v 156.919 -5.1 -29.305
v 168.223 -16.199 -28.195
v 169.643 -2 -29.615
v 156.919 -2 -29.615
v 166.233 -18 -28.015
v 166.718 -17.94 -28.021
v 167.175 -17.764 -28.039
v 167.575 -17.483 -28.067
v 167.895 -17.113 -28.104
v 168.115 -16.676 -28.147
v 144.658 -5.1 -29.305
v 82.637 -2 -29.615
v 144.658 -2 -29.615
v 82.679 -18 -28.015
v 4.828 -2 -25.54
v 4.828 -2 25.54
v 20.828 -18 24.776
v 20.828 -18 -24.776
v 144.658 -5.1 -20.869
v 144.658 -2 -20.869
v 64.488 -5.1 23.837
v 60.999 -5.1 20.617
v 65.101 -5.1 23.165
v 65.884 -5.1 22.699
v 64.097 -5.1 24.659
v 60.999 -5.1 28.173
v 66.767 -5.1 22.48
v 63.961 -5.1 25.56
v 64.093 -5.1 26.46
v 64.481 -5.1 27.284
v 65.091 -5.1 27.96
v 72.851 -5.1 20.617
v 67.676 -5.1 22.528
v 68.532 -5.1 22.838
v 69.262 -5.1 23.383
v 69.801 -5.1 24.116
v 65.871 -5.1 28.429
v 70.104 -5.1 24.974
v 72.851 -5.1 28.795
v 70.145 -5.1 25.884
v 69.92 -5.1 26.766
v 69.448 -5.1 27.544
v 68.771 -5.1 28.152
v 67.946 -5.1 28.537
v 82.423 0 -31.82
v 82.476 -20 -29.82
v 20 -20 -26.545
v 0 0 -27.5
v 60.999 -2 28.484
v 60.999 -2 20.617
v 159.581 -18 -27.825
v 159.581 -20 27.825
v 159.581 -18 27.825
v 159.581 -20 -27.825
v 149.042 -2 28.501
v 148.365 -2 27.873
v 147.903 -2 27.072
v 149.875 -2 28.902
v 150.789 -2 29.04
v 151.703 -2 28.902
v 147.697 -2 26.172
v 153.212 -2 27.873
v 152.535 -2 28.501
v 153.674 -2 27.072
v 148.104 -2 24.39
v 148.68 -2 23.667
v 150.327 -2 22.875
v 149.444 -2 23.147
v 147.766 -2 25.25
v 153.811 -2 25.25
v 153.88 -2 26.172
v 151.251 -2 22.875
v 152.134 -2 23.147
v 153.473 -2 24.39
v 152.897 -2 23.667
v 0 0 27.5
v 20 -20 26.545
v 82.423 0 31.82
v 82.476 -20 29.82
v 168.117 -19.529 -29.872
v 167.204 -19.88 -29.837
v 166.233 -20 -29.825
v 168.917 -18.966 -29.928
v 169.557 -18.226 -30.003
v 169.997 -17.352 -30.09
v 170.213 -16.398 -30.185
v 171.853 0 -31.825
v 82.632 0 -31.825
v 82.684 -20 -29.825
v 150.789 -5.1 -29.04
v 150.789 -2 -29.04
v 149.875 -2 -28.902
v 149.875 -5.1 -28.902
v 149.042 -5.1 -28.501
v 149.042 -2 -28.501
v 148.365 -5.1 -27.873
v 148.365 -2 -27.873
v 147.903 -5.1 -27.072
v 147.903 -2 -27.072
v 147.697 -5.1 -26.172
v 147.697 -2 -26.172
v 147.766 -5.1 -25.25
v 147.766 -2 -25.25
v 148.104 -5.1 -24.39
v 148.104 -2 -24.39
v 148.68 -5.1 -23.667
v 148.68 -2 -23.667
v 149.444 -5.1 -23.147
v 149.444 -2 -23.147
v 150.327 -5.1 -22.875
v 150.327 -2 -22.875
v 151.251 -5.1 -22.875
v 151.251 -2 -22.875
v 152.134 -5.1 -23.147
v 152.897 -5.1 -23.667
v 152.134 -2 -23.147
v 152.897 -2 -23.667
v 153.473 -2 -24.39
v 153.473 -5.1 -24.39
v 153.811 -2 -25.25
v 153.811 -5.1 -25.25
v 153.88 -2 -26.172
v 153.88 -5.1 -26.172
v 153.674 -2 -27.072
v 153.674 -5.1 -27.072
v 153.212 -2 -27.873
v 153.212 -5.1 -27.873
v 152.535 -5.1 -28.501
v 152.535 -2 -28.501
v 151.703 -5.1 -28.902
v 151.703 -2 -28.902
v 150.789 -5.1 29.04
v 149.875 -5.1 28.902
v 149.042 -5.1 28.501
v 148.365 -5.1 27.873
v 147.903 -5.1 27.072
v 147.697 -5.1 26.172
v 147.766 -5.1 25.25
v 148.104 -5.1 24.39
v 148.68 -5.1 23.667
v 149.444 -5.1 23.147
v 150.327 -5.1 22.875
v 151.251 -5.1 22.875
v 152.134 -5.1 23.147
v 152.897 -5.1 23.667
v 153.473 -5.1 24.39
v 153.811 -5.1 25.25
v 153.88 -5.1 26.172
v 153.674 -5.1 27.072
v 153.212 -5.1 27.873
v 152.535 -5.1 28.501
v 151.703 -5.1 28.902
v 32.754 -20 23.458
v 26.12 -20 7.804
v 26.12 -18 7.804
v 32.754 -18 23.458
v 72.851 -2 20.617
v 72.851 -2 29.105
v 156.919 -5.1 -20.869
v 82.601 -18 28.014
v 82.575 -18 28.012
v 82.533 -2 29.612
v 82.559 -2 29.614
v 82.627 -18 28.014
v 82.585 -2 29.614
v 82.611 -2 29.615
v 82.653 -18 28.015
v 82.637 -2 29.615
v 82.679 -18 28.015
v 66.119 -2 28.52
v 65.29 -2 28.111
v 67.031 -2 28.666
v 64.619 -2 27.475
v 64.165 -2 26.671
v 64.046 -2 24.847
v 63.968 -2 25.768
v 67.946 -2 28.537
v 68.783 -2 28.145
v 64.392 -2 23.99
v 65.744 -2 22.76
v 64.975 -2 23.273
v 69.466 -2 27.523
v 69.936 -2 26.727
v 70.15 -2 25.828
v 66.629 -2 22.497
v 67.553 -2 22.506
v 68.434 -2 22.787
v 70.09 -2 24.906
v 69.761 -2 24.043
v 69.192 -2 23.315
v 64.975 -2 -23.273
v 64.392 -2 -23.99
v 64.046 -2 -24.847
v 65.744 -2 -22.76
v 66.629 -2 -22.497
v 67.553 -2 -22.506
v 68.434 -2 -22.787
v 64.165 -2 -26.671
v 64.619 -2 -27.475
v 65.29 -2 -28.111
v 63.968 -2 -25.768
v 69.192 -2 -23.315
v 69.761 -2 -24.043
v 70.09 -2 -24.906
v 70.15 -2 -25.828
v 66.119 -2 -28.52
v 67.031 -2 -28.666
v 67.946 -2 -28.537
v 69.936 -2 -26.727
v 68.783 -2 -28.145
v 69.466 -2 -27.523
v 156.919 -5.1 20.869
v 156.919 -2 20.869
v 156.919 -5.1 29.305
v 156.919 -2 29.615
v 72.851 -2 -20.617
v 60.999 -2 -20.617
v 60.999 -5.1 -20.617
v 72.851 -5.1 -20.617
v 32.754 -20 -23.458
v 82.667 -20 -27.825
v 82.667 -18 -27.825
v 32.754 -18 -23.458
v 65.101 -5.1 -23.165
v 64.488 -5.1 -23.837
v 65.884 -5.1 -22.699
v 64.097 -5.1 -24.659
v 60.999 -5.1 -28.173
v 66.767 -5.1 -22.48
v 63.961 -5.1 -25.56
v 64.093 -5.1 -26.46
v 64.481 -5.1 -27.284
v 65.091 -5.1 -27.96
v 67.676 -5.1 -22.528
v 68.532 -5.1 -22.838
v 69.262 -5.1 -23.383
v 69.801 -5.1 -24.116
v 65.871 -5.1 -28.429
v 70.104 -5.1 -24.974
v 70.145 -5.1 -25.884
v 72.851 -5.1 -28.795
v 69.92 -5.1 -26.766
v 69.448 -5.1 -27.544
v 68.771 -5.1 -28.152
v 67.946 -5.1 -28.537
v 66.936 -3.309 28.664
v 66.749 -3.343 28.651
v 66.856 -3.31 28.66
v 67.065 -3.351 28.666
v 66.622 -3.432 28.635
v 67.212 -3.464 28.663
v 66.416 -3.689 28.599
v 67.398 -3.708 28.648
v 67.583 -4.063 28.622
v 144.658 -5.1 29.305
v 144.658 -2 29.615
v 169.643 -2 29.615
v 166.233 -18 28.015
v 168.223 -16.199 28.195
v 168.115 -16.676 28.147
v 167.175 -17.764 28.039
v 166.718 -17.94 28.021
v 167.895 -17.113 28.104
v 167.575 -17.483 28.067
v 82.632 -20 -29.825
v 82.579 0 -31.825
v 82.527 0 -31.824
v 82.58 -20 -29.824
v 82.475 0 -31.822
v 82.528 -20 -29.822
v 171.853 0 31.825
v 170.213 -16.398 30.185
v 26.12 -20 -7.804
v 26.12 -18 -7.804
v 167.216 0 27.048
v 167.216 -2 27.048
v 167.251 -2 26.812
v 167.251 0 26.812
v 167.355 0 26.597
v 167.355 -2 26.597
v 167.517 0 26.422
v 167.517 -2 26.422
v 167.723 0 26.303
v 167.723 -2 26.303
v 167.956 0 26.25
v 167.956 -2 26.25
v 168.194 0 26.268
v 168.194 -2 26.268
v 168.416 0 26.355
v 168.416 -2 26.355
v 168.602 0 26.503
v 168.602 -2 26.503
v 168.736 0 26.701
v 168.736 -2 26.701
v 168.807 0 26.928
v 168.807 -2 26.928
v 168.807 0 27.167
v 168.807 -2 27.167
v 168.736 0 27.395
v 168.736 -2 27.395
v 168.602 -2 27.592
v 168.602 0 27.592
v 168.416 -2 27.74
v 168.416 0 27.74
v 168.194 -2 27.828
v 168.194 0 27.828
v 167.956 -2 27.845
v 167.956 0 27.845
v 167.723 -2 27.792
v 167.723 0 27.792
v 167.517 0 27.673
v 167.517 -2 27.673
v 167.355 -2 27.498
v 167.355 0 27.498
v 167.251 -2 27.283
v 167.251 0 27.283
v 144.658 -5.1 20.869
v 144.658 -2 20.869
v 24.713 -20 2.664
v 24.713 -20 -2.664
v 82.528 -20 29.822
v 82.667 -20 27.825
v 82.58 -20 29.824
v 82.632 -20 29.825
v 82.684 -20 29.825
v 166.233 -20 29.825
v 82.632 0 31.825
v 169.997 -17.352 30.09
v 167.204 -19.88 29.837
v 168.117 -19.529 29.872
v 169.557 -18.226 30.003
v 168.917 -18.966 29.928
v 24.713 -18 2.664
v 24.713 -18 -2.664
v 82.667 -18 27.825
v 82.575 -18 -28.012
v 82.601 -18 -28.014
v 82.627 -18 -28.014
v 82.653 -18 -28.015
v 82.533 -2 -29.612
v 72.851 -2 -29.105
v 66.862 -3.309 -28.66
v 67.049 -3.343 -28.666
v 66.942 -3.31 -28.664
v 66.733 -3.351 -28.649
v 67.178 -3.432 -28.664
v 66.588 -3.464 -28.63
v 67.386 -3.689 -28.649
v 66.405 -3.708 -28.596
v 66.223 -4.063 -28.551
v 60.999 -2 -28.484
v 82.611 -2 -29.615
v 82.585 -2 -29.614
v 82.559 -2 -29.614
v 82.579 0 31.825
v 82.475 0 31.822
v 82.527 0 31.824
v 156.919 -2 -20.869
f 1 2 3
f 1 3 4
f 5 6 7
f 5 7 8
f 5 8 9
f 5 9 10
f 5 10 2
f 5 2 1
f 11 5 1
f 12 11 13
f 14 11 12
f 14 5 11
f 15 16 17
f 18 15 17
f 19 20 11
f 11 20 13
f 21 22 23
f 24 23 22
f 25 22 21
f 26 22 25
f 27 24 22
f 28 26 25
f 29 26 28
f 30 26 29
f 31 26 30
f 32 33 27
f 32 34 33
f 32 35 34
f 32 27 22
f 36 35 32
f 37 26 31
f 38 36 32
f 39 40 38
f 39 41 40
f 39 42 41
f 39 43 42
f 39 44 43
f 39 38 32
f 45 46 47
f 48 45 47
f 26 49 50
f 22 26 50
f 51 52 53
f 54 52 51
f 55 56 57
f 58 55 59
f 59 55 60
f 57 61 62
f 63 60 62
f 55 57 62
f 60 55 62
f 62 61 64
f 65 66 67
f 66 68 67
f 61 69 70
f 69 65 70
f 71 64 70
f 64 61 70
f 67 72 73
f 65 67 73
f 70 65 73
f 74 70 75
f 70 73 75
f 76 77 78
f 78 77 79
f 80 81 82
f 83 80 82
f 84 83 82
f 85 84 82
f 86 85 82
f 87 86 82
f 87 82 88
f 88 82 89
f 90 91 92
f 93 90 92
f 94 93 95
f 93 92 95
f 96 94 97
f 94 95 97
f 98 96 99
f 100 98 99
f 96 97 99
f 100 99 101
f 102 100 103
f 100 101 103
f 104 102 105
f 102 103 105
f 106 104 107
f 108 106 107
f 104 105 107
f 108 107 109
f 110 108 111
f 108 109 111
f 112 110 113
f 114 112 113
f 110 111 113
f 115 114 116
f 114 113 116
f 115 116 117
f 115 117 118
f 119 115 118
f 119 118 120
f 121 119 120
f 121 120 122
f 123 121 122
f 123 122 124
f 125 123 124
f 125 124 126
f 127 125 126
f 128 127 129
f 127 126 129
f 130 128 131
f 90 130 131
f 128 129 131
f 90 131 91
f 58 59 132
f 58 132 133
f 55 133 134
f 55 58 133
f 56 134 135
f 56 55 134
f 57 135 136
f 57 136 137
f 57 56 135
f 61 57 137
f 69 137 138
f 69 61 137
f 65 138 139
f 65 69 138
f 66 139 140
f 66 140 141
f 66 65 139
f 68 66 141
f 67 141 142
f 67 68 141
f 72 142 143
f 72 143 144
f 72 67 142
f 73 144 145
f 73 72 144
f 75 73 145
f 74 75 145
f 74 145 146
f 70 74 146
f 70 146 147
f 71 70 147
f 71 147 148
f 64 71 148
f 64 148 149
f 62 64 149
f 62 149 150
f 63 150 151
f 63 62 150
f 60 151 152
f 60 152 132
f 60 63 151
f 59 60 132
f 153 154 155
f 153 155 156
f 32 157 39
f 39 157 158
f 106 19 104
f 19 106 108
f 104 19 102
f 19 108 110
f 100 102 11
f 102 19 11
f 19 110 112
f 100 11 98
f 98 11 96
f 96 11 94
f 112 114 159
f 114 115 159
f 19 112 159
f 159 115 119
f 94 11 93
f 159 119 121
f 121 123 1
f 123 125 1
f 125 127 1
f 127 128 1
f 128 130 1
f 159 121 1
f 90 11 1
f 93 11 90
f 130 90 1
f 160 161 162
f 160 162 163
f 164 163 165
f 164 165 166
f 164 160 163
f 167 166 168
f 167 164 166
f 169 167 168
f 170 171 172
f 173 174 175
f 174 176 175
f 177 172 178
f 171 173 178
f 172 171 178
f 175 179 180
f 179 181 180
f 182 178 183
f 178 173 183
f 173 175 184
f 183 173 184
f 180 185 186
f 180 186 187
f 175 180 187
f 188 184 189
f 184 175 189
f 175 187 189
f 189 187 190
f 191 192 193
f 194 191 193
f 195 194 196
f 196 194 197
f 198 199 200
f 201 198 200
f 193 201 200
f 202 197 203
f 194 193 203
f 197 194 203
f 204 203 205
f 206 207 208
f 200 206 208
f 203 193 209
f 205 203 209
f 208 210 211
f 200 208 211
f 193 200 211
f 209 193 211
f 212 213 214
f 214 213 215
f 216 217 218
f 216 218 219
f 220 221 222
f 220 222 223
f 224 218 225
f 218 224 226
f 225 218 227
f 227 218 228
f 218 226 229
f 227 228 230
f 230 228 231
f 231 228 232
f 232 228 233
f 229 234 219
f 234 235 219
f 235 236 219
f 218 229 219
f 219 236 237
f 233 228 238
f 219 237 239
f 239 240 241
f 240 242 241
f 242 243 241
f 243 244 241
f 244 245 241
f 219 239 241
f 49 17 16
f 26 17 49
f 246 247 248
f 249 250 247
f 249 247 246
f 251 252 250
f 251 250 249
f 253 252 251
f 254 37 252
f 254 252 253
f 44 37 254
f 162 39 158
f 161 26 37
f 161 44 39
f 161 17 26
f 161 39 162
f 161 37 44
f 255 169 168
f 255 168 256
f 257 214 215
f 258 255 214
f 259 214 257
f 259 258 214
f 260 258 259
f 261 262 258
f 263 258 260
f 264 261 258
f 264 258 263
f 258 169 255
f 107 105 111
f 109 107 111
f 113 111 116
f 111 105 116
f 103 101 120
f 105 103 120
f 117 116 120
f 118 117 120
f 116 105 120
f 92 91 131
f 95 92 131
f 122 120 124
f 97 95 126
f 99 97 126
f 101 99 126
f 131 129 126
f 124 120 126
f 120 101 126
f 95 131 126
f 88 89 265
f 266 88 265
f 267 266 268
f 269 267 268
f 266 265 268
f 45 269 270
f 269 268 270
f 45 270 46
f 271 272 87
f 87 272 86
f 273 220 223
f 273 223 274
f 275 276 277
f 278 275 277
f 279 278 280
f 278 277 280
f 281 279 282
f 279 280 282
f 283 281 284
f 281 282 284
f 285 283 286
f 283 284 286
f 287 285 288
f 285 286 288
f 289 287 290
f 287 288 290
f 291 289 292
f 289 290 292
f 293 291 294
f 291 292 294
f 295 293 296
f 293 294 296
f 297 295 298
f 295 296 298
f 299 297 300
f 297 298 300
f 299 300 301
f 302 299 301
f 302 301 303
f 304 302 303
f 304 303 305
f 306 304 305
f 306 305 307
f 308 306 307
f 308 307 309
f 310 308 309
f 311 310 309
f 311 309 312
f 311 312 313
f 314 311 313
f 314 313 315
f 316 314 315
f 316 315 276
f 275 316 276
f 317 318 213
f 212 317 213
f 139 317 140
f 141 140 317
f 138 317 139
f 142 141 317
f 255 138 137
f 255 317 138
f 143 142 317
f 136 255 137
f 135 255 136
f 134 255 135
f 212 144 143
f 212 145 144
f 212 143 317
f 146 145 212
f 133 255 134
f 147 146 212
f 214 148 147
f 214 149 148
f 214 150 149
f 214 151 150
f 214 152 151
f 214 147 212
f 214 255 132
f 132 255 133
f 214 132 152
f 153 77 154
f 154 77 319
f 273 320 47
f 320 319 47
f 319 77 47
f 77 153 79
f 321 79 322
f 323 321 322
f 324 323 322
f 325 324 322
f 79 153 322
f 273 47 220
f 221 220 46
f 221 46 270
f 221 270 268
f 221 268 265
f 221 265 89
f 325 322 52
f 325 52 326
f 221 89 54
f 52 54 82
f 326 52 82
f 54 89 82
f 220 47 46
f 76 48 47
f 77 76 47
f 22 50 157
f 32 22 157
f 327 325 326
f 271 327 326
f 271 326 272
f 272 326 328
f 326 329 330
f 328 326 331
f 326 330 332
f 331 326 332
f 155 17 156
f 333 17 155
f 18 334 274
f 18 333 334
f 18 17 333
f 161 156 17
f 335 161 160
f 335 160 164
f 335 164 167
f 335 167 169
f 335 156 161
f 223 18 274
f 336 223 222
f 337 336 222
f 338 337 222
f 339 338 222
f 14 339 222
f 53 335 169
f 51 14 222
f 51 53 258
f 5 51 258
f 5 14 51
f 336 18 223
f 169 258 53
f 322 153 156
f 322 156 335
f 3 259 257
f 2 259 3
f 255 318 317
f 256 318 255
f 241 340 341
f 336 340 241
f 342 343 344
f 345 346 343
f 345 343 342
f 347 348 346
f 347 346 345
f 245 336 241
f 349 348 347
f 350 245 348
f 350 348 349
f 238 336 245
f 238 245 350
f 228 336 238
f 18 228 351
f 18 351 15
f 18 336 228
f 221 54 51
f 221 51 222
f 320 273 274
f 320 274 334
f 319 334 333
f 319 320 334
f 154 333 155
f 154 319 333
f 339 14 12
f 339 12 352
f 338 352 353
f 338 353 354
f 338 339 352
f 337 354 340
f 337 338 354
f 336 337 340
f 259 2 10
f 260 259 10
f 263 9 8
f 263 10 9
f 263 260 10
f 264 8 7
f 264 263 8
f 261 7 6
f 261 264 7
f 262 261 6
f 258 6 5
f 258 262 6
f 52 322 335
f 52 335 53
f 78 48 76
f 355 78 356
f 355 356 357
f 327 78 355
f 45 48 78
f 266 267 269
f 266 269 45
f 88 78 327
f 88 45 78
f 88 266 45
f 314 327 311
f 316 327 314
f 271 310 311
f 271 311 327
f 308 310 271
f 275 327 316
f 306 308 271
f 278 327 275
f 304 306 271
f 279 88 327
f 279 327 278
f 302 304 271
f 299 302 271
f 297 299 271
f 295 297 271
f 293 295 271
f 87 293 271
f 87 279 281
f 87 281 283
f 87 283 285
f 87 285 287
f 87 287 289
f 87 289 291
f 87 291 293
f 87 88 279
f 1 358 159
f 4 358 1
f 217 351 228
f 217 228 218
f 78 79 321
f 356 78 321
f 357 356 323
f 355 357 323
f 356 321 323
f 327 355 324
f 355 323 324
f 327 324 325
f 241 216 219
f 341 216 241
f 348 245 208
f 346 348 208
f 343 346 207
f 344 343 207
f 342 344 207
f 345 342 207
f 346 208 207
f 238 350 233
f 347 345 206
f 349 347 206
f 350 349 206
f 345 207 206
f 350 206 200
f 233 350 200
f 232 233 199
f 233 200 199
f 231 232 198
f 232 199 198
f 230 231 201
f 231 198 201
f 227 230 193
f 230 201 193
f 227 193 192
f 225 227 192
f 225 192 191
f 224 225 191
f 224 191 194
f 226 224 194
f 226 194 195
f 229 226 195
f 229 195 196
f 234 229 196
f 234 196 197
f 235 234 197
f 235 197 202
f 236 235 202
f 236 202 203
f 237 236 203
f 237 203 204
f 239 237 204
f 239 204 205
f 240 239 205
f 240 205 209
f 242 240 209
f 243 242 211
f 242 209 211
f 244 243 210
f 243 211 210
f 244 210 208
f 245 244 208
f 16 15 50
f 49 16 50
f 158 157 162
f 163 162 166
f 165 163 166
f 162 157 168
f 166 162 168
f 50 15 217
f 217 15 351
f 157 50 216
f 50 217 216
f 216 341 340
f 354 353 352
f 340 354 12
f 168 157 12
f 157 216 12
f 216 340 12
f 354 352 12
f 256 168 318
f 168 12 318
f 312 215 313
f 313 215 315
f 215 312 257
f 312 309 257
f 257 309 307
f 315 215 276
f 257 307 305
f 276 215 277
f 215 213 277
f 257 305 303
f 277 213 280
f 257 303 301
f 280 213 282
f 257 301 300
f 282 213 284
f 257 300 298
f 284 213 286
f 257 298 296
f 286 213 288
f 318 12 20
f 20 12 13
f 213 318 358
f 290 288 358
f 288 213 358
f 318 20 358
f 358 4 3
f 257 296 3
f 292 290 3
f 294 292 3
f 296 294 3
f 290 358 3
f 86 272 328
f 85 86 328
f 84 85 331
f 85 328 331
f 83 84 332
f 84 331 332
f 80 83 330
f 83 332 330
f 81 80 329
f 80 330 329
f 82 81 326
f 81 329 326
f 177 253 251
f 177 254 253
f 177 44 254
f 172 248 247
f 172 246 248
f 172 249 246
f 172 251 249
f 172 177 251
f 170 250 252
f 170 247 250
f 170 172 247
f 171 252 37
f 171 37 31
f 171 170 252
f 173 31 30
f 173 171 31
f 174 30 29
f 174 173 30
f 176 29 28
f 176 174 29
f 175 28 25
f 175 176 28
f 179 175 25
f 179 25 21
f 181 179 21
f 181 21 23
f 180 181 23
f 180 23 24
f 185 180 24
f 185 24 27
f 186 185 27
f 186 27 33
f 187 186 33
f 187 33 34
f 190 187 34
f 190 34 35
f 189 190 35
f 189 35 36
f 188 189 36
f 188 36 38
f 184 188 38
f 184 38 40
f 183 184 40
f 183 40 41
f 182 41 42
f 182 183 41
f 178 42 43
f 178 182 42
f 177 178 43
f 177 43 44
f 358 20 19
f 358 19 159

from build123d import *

# Parameters (mm, degrees)
LOFT_2_DEPTH             = 20
LOFT_2_DRAFT             = -5.7105931
CUT_EXTRUDE_8_DEPTH      = 176.915490387
CUT_EXTRUDE_8_DEPTH_BACK = 176.915490387
FILLET_1_R               = 4
SHELL_1_T                = 2
CUT_EXTRUDE_9_DEPTH      = 2
SKETCH_15_R              = 3.1
EXTRUDE_2_DEPTH          = 3.1
SKETCH_16_W              = 12.261336097
SKETCH_16_H              = 9.48947362
SKETCH_16_R              = 3.1
EXTRUDE_3_DEPTH          = 3.1
HOLE_WIZARD_M2_1_D       = 1.6
HOLE_WIZARD_M2_1_DEPTH   = 2


# Read off the part's stored shape, not the designer's step: 放样2
with BuildPart() as part:
    # 放样2 outline → 放样2 (with draft: the straight prism first)
    with BuildSketch(Plane(origin=(0, -20, 0), x_dir=(1, 0, 0), z_dir=(0, 1, 0))):
        Polygon((2, -25.602070867), (82.579718414, -29.825074964), (169.852914921, -29.825074964), (169.852914921, 29.825074964), (82.579718414, 29.825074964), (2, 25.602070867), align=None)
    extrude(amount=LOFT_2_DEPTH)
    # 放样2: the draft: its side faces are tilted about the plane it starts from
    loft_2_sides = [part.faces().sort_by_distance(p)[0] for p in [
        (42.289859207, -10, 27.713572915),
        (126.216316668, -10, 29.825074964),
        (169.852914921, -10, 0),
        (126.216316667, -10, -29.825074964),
        (42.289859207, -10, -27.713572915),
        (2, -10, 0),
    ]]
    draft(loft_2_sides, Plane(origin=(0, -20, 0), x_dir=(1, 0, 0), z_dir=(0, 1, 0)), LOFT_2_DRAFT)

    # 草图8 → 切除-拉伸8 (cut, two sides: drawn at the far end of the back side and taken through both)
    with BuildSketch(Plane.XY.offset(-CUT_EXTRUDE_8_DEPTH_BACK)):
        Polygon((0, 0), (20, -20), (-19.267413558, -20), align=None)
    extrude(amount=CUT_EXTRUDE_8_DEPTH + CUT_EXTRUDE_8_DEPTH_BACK, mode=Mode.SUBTRACT)

    # 圆角1
    # the kernel refuses this fillet: 4 mm, written as the material it takes off along each edge
    with BuildSketch(Plane(origin=(82.580397323, -20.25926479, -29.799148485), x_dir=(-0.9986397137740413, 0.0025926566839660006, 0.0520768682297623), z_dir=(-0.002605587720042804, 0.9950338125721717, -0.09950338059946291))) as fillet_1_piece_1:
        with BuildLine():
            CenterArc((FILLET_1_R * 0.0260558773727, FILLET_1_R), FILLET_1_R, 267.014891807, 2.985108193)
            Line((-FILLET_1_R * 0.0260205222495, FILLET_1_R * 0.00135689628257), (0, 0))
            Line((0, 0), (FILLET_1_R * 0.0260558773727, 0))
        make_face()
    extrude(amount=20.620937018, mode=Mode.SUBTRACT)
    with BuildSketch(Plane(origin=(82.580397323, -20.25926479, 29.799148485), x_dir=(-0.9986397137740393, 0.002592656683969708, -0.05207686822979932), z_dir=(-0.002605587720042804, 0.9950338125721717, 0.09950338059946291))) as fillet_1_piece_2:
        with BuildLine():
            CenterArc((FILLET_1_R * 0.0260558773727, -FILLET_1_R), FILLET_1_R, 90, 2.985108193)
            Line((-FILLET_1_R * 0.0260205222495, -FILLET_1_R * 0.00135689628257), (0, 0))
            Line((0, 0), (FILLET_1_R * 0.0260558773727, 0))
        make_face()
    extrude(amount=20.620937018, mode=Mode.SUBTRACT)
    with BuildSketch(Plane(origin=(169.852914921, -20, 38.874950591), x_dir=(-1, 0, 0), z_dir=(0, 0, -1))) as fillet_1_piece_3:
        with BuildLine():
            CenterArc((FILLET_1_R * 0.904987562707, FILLET_1_R), FILLET_1_R, 185.7105931, 84.2894069)
            Line((-FILLET_1_R * 0.0900496275678, FILLET_1_R * 0.90049628163), (0, 0))
            Line((0, 0), (FILLET_1_R * 0.904987562707, 0))
        make_face()
    extrude(amount=77.749901182, mode=Mode.SUBTRACT)

    # 抽壳1 (no face opened: a closed hollow body)
    add(offset(amount=-SHELL_1_T, mode=Mode.PRIVATE), mode=Mode.SUBTRACT)

    # 草图11 → 切除-拉伸9 (cut)
    with BuildSketch(Plane(origin=(0, -20, 0), x_dir=(1, 0, 0), z_dir=(0, 1, 0))):
        with BuildLine():
            Line((32.7540299, 23.458252391), (26.119793836, 7.804096994))
            ThreePointArc((26.119793836, 7.804096994), (24.534355196, 0), (26.119793836, -7.804096994))
            Line((26.119793836, -7.804096994), (32.7540299, -23.458252391))
            Line((32.7540299, -23.458252391), (82.6670403, -27.825074964))
            Line((82.6670403, -27.825074964), (159.58071917, -27.825074964))
            Line((159.58071917, -27.825074964), (159.58071917, 27.825074964))
            Line((159.58071917, 27.825074964), (82.6670403, 27.825074964))
            Line((82.6670403, 27.825074964), (32.7540299, 23.458252391))
        make_face()
    extrude(amount=CUT_EXTRUDE_9_DEPTH, mode=Mode.SUBTRACT)

    # 草图15 → 凸台-拉伸2 (add)
    with BuildSketch(Plane.XZ.offset(2)):
        Polygon((72.850599149, 29.104930146), (60.999300983, 28.483829928), (60.999300983, 20.617464002), (72.850599149, 20.617464002), align=None)
        with Locations(Location((67.061317629, 25.566411224, 0), (0, 0, 73.416746399))):
            Circle(SKETCH_15_R, mode=Mode.SUBTRACT)
    extrude_2 = extrude(amount=EXTRUDE_2_DEPTH)

    # 镜向1: 凸台-拉伸2 across plane
    add(extrude_2.mirror(Plane(origin=(0, 0, 0), x_dir=(1, 0, 0), z_dir=(0, 0, -1))))

    # 草图16 → 凸台-拉伸3 (add)
    with BuildSketch(Plane.XZ.offset(2)):
        with Locations((150.788762168, 25.613857156)):
            Rectangle(SKETCH_16_W, SKETCH_16_H)
        with Locations(Location((150.788762168, 25.939901438, 0), (0, 0, 90))):
            Circle(SKETCH_16_R, mode=Mode.SUBTRACT)
    extrude_3 = extrude(amount=EXTRUDE_3_DEPTH)

    # 镜向2: 凸台-拉伸3 across plane
    add(extrude_3.mirror(Plane(origin=(0, 0, 0), x_dir=(1, 0, 0), z_dir=(0, 0, -1))))

    # M2 螺纹孔1
    with Locations(Plane(origin=(0, 0, 0), x_dir=(1, 0, 0), z_dir=(0, 1, 0))):
        with Locations((168.015540482, -27.047622993)):
            Hole(HOLE_WIZARD_M2_1_D / 2, depth=HOLE_WIZARD_M2_1_DEPTH)


solid = part.part
